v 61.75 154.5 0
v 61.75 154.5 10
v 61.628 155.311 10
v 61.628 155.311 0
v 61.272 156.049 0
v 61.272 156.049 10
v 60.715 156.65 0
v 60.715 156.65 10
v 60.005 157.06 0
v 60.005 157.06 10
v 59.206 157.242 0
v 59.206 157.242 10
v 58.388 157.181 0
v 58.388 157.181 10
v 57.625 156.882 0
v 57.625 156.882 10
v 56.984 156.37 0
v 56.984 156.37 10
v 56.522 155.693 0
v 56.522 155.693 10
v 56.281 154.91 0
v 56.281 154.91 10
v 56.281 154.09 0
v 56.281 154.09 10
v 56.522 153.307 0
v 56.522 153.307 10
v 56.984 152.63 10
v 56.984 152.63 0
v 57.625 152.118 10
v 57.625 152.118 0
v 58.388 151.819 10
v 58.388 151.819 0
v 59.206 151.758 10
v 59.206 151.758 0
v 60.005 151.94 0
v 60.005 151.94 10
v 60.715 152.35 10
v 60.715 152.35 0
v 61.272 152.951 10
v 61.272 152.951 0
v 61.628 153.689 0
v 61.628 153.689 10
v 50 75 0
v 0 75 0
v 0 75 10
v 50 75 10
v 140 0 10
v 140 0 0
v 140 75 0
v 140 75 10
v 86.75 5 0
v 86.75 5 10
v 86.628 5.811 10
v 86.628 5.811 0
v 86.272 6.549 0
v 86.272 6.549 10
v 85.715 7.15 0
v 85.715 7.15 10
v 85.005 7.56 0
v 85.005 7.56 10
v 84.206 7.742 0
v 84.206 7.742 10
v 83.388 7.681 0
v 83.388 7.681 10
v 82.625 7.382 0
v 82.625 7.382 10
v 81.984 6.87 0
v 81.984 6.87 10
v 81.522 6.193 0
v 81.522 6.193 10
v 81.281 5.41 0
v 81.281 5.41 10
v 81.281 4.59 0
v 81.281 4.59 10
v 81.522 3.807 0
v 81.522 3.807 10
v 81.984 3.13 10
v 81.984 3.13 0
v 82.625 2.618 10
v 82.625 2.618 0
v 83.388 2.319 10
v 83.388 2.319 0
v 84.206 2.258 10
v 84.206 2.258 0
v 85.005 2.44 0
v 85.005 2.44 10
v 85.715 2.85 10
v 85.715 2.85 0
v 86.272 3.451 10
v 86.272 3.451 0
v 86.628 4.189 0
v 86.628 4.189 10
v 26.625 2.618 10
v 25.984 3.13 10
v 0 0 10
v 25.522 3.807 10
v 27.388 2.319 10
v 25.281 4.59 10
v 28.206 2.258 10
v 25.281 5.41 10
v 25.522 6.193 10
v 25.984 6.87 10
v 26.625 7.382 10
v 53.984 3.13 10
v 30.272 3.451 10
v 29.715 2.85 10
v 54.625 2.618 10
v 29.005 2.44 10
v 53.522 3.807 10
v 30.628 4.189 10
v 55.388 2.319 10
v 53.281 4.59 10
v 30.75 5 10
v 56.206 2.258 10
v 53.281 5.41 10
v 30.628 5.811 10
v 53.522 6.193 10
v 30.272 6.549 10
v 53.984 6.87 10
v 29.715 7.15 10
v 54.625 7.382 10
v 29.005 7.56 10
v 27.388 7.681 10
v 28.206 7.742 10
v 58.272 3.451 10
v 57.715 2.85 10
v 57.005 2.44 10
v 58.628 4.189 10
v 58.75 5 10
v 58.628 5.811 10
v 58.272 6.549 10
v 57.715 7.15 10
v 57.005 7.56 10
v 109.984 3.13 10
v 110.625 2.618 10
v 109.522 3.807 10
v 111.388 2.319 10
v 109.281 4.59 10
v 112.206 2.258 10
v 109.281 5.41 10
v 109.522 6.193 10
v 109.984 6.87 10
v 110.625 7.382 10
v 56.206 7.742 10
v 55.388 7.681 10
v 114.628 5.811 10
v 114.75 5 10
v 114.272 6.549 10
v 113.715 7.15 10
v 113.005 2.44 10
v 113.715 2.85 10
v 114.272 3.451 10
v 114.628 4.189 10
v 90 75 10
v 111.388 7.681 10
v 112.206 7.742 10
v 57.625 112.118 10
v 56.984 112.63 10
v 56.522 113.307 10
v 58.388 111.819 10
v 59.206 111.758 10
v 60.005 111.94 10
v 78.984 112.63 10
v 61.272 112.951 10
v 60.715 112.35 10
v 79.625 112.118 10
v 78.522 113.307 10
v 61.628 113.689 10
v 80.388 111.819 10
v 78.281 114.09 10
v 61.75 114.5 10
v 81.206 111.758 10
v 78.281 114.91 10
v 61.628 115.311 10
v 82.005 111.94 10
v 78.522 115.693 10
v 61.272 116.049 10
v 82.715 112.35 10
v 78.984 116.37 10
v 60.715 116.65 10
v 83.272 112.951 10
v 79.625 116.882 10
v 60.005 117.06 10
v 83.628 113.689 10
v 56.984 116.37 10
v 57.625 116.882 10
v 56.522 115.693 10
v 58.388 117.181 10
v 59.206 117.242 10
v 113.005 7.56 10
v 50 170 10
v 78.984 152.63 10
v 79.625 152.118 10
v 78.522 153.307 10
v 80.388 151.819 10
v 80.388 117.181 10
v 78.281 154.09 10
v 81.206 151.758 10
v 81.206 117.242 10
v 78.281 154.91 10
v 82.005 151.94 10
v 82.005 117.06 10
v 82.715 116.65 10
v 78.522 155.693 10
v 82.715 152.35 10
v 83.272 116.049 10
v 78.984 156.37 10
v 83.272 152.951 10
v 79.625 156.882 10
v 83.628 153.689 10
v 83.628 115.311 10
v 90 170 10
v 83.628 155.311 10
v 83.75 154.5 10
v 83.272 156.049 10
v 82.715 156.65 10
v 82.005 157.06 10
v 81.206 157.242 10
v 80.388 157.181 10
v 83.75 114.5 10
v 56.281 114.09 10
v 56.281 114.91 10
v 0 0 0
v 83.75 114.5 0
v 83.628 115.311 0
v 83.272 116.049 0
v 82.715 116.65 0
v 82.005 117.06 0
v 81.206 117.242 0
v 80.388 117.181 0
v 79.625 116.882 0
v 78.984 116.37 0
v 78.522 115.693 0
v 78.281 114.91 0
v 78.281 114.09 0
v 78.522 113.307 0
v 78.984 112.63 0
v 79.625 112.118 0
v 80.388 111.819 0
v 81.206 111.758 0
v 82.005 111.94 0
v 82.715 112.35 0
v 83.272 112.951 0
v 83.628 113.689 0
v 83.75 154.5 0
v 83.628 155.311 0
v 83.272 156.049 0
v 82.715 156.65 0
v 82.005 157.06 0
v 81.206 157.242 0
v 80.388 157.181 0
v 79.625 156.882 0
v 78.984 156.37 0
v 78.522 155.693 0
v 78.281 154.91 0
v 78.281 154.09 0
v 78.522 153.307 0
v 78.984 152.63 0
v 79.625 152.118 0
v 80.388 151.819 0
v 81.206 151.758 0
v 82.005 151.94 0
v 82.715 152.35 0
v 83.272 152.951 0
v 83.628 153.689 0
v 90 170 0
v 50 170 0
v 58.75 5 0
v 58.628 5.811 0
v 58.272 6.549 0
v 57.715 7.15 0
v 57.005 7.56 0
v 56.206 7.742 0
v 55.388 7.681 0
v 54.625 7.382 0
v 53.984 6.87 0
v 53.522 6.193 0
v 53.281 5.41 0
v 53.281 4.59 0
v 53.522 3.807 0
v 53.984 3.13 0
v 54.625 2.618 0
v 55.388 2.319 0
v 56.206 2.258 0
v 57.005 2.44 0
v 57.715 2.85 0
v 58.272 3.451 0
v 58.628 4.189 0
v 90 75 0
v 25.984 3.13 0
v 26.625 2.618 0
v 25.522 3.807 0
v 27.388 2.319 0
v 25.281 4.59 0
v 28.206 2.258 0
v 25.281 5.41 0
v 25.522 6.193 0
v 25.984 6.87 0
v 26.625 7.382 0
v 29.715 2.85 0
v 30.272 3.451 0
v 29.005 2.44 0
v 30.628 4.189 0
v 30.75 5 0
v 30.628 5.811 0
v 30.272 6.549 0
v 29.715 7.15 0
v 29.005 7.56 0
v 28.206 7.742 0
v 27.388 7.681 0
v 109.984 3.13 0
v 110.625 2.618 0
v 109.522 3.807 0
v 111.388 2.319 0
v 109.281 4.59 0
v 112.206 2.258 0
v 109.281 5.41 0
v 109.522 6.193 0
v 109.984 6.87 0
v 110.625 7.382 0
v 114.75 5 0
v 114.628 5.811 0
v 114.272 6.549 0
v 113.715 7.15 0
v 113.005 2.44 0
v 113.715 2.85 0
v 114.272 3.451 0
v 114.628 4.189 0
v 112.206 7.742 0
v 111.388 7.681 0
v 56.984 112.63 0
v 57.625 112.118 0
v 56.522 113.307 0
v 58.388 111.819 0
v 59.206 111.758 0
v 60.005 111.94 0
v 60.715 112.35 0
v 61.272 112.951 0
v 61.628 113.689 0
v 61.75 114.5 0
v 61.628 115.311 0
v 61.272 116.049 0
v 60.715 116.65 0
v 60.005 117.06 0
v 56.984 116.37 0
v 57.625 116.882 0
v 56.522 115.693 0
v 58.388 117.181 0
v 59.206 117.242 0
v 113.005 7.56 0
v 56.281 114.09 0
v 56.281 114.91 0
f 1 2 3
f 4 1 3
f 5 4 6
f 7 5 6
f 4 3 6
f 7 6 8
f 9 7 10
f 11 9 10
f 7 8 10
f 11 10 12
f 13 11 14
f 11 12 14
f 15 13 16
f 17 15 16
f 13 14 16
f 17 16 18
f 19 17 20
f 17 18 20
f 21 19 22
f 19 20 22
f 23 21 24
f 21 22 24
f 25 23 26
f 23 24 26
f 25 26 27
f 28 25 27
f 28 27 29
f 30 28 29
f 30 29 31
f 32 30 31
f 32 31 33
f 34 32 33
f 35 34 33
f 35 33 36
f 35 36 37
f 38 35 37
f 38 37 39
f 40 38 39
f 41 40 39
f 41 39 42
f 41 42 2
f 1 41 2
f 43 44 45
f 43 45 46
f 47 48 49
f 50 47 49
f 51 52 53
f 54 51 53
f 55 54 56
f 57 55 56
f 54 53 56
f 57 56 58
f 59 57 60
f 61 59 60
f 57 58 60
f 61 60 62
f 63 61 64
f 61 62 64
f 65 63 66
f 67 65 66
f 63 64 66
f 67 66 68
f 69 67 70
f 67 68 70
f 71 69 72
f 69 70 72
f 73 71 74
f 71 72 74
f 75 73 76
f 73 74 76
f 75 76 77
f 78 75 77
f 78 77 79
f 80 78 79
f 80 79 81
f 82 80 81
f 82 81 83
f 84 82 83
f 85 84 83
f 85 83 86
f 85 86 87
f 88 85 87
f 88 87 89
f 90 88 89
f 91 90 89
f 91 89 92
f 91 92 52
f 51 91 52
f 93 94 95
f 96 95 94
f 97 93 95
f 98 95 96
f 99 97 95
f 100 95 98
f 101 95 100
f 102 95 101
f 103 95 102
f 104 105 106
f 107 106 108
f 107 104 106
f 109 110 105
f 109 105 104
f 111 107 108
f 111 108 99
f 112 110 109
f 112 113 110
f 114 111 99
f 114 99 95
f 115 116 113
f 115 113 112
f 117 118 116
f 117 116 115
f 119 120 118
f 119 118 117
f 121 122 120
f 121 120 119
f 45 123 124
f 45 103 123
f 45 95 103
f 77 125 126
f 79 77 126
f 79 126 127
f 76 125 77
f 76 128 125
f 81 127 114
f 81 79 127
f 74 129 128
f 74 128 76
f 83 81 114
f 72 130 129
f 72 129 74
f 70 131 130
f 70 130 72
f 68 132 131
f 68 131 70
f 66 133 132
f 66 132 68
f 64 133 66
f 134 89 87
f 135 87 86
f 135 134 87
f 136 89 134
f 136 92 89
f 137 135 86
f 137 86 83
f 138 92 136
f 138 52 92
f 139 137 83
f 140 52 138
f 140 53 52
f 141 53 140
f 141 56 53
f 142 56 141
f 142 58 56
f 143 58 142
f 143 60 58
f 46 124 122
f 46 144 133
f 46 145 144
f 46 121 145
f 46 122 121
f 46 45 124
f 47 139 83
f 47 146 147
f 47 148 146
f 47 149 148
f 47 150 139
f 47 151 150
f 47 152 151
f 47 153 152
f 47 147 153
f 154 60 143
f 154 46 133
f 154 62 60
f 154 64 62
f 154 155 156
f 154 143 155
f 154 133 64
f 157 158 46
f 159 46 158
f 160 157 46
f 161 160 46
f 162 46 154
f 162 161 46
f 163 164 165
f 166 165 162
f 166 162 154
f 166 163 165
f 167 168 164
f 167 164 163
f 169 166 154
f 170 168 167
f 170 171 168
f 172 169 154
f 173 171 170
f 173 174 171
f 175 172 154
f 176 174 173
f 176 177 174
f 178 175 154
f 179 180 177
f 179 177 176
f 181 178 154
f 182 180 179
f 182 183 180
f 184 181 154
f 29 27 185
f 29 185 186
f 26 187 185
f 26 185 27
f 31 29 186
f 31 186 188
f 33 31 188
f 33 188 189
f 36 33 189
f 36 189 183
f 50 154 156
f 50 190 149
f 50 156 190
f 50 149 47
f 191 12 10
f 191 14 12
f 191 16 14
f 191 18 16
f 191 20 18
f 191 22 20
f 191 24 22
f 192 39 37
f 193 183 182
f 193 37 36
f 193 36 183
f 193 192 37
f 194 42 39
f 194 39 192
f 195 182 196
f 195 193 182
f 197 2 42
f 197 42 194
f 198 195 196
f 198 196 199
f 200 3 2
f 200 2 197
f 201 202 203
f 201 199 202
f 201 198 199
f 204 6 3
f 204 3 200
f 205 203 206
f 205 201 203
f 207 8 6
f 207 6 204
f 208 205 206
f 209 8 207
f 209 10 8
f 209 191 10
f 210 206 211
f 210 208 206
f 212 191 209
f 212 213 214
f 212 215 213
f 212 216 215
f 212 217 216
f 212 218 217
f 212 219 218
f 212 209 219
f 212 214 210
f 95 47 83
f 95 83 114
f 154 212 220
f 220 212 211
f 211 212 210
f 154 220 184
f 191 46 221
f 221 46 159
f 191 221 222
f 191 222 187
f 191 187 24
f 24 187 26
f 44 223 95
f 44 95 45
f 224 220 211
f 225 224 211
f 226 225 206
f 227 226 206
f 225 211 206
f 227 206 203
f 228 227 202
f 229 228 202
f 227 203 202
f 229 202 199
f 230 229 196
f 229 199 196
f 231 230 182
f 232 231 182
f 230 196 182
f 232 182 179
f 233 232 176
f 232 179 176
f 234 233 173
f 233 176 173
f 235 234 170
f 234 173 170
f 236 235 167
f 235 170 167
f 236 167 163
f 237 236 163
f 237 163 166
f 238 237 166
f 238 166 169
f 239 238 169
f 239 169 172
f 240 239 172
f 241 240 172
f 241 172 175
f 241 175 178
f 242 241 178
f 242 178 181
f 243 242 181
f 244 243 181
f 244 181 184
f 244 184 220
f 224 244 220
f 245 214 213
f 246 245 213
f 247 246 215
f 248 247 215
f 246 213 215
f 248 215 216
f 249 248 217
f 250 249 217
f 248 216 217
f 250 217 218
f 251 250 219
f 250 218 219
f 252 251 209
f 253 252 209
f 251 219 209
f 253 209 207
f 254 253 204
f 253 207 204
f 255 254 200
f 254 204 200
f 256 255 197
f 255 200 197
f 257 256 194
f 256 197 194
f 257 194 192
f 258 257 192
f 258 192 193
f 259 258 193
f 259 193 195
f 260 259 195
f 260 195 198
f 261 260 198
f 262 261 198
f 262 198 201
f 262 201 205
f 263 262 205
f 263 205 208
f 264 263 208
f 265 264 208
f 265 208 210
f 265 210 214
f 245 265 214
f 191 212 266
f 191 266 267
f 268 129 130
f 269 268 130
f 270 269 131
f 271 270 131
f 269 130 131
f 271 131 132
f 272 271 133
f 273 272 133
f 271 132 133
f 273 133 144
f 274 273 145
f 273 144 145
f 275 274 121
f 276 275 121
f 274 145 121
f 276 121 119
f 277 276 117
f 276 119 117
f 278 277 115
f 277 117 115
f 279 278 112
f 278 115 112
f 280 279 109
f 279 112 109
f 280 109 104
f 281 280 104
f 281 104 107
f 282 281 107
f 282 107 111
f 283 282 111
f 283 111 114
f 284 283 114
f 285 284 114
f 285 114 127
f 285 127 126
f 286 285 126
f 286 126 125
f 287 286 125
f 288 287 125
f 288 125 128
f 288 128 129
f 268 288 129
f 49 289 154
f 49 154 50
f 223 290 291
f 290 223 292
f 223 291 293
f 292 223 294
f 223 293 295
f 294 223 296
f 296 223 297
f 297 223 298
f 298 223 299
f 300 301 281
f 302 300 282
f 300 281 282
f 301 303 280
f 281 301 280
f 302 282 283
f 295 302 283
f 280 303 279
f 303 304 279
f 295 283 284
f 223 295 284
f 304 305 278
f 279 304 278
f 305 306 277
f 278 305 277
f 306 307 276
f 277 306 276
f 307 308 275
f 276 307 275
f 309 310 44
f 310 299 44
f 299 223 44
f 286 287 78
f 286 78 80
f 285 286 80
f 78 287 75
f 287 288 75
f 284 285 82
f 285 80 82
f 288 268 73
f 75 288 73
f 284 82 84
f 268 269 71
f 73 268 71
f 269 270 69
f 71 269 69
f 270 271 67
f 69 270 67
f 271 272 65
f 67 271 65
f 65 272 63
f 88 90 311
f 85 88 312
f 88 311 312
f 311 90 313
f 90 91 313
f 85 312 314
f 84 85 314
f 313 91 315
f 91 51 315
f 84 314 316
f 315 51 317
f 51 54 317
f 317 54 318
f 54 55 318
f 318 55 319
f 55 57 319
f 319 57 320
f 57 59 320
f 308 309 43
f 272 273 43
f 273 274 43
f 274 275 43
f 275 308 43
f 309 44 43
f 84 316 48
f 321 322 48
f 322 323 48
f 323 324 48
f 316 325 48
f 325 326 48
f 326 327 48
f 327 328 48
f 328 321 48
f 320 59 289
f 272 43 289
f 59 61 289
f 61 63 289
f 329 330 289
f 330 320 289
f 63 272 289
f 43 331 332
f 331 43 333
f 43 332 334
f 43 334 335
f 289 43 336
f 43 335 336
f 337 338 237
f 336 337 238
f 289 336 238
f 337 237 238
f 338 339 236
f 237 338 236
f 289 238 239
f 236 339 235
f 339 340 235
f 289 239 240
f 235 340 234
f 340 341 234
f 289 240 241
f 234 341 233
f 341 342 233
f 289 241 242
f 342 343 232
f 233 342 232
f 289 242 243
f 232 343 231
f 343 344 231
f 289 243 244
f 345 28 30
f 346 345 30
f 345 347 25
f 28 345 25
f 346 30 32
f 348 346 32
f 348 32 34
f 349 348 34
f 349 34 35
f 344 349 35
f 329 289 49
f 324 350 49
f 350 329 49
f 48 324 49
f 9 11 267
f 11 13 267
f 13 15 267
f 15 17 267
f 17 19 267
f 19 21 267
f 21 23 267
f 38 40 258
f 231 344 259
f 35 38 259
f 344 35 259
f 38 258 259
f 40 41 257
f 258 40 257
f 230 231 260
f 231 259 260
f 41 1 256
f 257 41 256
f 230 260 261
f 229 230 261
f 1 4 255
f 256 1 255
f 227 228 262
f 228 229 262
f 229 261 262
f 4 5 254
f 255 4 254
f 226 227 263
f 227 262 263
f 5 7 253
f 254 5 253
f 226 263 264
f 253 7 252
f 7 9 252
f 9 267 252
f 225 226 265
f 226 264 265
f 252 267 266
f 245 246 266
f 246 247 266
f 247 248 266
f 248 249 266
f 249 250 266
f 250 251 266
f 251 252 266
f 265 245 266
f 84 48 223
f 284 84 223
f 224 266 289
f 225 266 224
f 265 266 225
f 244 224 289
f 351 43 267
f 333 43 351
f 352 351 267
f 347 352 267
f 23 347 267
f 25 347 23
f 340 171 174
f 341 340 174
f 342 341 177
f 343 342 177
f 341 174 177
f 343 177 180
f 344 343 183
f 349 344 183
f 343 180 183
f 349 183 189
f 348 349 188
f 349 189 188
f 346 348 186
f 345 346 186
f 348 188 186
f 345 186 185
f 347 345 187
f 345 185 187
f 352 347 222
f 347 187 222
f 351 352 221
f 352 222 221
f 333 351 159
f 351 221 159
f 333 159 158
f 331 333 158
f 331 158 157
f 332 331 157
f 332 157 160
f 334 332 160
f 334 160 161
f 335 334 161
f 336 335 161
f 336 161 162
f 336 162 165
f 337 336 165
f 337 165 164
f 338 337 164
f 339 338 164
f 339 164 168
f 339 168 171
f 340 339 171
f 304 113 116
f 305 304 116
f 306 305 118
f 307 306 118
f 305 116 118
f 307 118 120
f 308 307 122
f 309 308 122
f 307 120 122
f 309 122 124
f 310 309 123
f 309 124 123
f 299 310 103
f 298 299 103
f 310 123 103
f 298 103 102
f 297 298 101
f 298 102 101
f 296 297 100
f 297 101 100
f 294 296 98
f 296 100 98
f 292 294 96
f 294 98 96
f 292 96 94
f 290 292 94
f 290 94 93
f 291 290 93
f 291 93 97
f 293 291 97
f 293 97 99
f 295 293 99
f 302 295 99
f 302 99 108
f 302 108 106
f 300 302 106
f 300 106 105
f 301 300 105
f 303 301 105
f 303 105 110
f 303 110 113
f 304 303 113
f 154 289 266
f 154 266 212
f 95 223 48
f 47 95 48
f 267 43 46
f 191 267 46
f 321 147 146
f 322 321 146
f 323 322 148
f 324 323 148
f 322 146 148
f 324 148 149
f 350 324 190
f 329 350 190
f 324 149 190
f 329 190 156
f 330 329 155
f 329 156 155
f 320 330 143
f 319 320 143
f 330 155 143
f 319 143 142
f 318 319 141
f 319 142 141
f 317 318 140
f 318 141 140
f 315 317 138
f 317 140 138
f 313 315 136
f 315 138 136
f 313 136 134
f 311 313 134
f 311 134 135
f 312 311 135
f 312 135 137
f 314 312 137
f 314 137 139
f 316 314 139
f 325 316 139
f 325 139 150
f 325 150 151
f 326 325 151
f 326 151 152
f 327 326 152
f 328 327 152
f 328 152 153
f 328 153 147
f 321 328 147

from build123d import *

# Parameters (mm, degrees)
SKETCH_W               = 140
SKETCH_H               = 75
PAD_DEPTH              = 10
SKETCH001_W            = 40
SKETCH001_H            = 10
PAD001_DEPTH           = 95
SKETCH002_R            = 2.75
HOLE_DEPTH             = 10.001
LINEARPATTERN_COUNT    = 4
LINEARPATTERN_PITCH    = 28
SKETCH003_R            = 2.75
HOLE001_DEPTH          = 10.001
LINEARPATTERN001_COUNT = 2
LINEARPATTERN001_PITCH = 22
LINEARPATTERN002_COUNT = 2
LINEARPATTERN002_PITCH = 40
SKETCH004_R            = 2.75
HOLE002_DEPTH          = 10.001


with BuildPart() as part:
    # Sketch → Pad (new body)
    with BuildSketch(Plane.XY):
        with Locations((70, 37.5)):
            Rectangle(SKETCH_W, SKETCH_H)
    extrude(amount=PAD_DEPTH)

    # Sketch001 (on Face3 of Pad) → Pad001 (join)
    with BuildSketch(Plane(origin=(0, 75, 0), x_dir=(-1, 0, 0), z_dir=(0, 1, 0))):
        with Locations((-70, 5)):
            Rectangle(SKETCH001_W, SKETCH001_H)
    extrude(amount=PAD001_DEPTH)

    # Sketch002 (on Face5 of Pad001) → Hole (cut, through all)
    with BuildSketch(Plane.XY.offset(10)):
        with Locations((28, 5)):
            Circle(SKETCH002_R)
    hole = extrude(amount=-HOLE_DEPTH, mode=Mode.SUBTRACT)

    # LinearPattern: Hole ×4
    with Locations(*[(i * LINEARPATTERN_PITCH, 0, 0) for i in range(1, LINEARPATTERN_COUNT)]):
        add(hole, mode=Mode.SUBTRACT)

    # Sketch003 (on Face13 of LinearPattern) → Hole001 (cut, through all)
    with BuildSketch(Plane.XY.offset(10)):
        with Locations((59, 114.5)):
            Circle(SKETCH003_R)
    hole001 = extrude(amount=-HOLE001_DEPTH, mode=Mode.SUBTRACT)

    # LinearPattern001: Hole001 ×2
    with Locations(*[(i * LINEARPATTERN001_PITCH, 0, 0) for i in range(1, LINEARPATTERN001_COUNT)]):
        add(hole001, mode=Mode.SUBTRACT)

    # LinearPattern002: Hole001 ×2
    with Locations(*[(0, i * LINEARPATTERN002_PITCH, 0) for i in range(1, LINEARPATTERN002_COUNT)]):
        add(hole001, mode=Mode.SUBTRACT)

    # Sketch004 (on Face13 of LinearPattern002) → Hole002 (cut, through all)
    with BuildSketch(Plane.XY.offset(10)):
        with Locations((81, 154.5)):
            Circle(SKETCH004_R)
    extrude(amount=-HOLE002_DEPTH, mode=Mode.SUBTRACT)


solid = part.part
